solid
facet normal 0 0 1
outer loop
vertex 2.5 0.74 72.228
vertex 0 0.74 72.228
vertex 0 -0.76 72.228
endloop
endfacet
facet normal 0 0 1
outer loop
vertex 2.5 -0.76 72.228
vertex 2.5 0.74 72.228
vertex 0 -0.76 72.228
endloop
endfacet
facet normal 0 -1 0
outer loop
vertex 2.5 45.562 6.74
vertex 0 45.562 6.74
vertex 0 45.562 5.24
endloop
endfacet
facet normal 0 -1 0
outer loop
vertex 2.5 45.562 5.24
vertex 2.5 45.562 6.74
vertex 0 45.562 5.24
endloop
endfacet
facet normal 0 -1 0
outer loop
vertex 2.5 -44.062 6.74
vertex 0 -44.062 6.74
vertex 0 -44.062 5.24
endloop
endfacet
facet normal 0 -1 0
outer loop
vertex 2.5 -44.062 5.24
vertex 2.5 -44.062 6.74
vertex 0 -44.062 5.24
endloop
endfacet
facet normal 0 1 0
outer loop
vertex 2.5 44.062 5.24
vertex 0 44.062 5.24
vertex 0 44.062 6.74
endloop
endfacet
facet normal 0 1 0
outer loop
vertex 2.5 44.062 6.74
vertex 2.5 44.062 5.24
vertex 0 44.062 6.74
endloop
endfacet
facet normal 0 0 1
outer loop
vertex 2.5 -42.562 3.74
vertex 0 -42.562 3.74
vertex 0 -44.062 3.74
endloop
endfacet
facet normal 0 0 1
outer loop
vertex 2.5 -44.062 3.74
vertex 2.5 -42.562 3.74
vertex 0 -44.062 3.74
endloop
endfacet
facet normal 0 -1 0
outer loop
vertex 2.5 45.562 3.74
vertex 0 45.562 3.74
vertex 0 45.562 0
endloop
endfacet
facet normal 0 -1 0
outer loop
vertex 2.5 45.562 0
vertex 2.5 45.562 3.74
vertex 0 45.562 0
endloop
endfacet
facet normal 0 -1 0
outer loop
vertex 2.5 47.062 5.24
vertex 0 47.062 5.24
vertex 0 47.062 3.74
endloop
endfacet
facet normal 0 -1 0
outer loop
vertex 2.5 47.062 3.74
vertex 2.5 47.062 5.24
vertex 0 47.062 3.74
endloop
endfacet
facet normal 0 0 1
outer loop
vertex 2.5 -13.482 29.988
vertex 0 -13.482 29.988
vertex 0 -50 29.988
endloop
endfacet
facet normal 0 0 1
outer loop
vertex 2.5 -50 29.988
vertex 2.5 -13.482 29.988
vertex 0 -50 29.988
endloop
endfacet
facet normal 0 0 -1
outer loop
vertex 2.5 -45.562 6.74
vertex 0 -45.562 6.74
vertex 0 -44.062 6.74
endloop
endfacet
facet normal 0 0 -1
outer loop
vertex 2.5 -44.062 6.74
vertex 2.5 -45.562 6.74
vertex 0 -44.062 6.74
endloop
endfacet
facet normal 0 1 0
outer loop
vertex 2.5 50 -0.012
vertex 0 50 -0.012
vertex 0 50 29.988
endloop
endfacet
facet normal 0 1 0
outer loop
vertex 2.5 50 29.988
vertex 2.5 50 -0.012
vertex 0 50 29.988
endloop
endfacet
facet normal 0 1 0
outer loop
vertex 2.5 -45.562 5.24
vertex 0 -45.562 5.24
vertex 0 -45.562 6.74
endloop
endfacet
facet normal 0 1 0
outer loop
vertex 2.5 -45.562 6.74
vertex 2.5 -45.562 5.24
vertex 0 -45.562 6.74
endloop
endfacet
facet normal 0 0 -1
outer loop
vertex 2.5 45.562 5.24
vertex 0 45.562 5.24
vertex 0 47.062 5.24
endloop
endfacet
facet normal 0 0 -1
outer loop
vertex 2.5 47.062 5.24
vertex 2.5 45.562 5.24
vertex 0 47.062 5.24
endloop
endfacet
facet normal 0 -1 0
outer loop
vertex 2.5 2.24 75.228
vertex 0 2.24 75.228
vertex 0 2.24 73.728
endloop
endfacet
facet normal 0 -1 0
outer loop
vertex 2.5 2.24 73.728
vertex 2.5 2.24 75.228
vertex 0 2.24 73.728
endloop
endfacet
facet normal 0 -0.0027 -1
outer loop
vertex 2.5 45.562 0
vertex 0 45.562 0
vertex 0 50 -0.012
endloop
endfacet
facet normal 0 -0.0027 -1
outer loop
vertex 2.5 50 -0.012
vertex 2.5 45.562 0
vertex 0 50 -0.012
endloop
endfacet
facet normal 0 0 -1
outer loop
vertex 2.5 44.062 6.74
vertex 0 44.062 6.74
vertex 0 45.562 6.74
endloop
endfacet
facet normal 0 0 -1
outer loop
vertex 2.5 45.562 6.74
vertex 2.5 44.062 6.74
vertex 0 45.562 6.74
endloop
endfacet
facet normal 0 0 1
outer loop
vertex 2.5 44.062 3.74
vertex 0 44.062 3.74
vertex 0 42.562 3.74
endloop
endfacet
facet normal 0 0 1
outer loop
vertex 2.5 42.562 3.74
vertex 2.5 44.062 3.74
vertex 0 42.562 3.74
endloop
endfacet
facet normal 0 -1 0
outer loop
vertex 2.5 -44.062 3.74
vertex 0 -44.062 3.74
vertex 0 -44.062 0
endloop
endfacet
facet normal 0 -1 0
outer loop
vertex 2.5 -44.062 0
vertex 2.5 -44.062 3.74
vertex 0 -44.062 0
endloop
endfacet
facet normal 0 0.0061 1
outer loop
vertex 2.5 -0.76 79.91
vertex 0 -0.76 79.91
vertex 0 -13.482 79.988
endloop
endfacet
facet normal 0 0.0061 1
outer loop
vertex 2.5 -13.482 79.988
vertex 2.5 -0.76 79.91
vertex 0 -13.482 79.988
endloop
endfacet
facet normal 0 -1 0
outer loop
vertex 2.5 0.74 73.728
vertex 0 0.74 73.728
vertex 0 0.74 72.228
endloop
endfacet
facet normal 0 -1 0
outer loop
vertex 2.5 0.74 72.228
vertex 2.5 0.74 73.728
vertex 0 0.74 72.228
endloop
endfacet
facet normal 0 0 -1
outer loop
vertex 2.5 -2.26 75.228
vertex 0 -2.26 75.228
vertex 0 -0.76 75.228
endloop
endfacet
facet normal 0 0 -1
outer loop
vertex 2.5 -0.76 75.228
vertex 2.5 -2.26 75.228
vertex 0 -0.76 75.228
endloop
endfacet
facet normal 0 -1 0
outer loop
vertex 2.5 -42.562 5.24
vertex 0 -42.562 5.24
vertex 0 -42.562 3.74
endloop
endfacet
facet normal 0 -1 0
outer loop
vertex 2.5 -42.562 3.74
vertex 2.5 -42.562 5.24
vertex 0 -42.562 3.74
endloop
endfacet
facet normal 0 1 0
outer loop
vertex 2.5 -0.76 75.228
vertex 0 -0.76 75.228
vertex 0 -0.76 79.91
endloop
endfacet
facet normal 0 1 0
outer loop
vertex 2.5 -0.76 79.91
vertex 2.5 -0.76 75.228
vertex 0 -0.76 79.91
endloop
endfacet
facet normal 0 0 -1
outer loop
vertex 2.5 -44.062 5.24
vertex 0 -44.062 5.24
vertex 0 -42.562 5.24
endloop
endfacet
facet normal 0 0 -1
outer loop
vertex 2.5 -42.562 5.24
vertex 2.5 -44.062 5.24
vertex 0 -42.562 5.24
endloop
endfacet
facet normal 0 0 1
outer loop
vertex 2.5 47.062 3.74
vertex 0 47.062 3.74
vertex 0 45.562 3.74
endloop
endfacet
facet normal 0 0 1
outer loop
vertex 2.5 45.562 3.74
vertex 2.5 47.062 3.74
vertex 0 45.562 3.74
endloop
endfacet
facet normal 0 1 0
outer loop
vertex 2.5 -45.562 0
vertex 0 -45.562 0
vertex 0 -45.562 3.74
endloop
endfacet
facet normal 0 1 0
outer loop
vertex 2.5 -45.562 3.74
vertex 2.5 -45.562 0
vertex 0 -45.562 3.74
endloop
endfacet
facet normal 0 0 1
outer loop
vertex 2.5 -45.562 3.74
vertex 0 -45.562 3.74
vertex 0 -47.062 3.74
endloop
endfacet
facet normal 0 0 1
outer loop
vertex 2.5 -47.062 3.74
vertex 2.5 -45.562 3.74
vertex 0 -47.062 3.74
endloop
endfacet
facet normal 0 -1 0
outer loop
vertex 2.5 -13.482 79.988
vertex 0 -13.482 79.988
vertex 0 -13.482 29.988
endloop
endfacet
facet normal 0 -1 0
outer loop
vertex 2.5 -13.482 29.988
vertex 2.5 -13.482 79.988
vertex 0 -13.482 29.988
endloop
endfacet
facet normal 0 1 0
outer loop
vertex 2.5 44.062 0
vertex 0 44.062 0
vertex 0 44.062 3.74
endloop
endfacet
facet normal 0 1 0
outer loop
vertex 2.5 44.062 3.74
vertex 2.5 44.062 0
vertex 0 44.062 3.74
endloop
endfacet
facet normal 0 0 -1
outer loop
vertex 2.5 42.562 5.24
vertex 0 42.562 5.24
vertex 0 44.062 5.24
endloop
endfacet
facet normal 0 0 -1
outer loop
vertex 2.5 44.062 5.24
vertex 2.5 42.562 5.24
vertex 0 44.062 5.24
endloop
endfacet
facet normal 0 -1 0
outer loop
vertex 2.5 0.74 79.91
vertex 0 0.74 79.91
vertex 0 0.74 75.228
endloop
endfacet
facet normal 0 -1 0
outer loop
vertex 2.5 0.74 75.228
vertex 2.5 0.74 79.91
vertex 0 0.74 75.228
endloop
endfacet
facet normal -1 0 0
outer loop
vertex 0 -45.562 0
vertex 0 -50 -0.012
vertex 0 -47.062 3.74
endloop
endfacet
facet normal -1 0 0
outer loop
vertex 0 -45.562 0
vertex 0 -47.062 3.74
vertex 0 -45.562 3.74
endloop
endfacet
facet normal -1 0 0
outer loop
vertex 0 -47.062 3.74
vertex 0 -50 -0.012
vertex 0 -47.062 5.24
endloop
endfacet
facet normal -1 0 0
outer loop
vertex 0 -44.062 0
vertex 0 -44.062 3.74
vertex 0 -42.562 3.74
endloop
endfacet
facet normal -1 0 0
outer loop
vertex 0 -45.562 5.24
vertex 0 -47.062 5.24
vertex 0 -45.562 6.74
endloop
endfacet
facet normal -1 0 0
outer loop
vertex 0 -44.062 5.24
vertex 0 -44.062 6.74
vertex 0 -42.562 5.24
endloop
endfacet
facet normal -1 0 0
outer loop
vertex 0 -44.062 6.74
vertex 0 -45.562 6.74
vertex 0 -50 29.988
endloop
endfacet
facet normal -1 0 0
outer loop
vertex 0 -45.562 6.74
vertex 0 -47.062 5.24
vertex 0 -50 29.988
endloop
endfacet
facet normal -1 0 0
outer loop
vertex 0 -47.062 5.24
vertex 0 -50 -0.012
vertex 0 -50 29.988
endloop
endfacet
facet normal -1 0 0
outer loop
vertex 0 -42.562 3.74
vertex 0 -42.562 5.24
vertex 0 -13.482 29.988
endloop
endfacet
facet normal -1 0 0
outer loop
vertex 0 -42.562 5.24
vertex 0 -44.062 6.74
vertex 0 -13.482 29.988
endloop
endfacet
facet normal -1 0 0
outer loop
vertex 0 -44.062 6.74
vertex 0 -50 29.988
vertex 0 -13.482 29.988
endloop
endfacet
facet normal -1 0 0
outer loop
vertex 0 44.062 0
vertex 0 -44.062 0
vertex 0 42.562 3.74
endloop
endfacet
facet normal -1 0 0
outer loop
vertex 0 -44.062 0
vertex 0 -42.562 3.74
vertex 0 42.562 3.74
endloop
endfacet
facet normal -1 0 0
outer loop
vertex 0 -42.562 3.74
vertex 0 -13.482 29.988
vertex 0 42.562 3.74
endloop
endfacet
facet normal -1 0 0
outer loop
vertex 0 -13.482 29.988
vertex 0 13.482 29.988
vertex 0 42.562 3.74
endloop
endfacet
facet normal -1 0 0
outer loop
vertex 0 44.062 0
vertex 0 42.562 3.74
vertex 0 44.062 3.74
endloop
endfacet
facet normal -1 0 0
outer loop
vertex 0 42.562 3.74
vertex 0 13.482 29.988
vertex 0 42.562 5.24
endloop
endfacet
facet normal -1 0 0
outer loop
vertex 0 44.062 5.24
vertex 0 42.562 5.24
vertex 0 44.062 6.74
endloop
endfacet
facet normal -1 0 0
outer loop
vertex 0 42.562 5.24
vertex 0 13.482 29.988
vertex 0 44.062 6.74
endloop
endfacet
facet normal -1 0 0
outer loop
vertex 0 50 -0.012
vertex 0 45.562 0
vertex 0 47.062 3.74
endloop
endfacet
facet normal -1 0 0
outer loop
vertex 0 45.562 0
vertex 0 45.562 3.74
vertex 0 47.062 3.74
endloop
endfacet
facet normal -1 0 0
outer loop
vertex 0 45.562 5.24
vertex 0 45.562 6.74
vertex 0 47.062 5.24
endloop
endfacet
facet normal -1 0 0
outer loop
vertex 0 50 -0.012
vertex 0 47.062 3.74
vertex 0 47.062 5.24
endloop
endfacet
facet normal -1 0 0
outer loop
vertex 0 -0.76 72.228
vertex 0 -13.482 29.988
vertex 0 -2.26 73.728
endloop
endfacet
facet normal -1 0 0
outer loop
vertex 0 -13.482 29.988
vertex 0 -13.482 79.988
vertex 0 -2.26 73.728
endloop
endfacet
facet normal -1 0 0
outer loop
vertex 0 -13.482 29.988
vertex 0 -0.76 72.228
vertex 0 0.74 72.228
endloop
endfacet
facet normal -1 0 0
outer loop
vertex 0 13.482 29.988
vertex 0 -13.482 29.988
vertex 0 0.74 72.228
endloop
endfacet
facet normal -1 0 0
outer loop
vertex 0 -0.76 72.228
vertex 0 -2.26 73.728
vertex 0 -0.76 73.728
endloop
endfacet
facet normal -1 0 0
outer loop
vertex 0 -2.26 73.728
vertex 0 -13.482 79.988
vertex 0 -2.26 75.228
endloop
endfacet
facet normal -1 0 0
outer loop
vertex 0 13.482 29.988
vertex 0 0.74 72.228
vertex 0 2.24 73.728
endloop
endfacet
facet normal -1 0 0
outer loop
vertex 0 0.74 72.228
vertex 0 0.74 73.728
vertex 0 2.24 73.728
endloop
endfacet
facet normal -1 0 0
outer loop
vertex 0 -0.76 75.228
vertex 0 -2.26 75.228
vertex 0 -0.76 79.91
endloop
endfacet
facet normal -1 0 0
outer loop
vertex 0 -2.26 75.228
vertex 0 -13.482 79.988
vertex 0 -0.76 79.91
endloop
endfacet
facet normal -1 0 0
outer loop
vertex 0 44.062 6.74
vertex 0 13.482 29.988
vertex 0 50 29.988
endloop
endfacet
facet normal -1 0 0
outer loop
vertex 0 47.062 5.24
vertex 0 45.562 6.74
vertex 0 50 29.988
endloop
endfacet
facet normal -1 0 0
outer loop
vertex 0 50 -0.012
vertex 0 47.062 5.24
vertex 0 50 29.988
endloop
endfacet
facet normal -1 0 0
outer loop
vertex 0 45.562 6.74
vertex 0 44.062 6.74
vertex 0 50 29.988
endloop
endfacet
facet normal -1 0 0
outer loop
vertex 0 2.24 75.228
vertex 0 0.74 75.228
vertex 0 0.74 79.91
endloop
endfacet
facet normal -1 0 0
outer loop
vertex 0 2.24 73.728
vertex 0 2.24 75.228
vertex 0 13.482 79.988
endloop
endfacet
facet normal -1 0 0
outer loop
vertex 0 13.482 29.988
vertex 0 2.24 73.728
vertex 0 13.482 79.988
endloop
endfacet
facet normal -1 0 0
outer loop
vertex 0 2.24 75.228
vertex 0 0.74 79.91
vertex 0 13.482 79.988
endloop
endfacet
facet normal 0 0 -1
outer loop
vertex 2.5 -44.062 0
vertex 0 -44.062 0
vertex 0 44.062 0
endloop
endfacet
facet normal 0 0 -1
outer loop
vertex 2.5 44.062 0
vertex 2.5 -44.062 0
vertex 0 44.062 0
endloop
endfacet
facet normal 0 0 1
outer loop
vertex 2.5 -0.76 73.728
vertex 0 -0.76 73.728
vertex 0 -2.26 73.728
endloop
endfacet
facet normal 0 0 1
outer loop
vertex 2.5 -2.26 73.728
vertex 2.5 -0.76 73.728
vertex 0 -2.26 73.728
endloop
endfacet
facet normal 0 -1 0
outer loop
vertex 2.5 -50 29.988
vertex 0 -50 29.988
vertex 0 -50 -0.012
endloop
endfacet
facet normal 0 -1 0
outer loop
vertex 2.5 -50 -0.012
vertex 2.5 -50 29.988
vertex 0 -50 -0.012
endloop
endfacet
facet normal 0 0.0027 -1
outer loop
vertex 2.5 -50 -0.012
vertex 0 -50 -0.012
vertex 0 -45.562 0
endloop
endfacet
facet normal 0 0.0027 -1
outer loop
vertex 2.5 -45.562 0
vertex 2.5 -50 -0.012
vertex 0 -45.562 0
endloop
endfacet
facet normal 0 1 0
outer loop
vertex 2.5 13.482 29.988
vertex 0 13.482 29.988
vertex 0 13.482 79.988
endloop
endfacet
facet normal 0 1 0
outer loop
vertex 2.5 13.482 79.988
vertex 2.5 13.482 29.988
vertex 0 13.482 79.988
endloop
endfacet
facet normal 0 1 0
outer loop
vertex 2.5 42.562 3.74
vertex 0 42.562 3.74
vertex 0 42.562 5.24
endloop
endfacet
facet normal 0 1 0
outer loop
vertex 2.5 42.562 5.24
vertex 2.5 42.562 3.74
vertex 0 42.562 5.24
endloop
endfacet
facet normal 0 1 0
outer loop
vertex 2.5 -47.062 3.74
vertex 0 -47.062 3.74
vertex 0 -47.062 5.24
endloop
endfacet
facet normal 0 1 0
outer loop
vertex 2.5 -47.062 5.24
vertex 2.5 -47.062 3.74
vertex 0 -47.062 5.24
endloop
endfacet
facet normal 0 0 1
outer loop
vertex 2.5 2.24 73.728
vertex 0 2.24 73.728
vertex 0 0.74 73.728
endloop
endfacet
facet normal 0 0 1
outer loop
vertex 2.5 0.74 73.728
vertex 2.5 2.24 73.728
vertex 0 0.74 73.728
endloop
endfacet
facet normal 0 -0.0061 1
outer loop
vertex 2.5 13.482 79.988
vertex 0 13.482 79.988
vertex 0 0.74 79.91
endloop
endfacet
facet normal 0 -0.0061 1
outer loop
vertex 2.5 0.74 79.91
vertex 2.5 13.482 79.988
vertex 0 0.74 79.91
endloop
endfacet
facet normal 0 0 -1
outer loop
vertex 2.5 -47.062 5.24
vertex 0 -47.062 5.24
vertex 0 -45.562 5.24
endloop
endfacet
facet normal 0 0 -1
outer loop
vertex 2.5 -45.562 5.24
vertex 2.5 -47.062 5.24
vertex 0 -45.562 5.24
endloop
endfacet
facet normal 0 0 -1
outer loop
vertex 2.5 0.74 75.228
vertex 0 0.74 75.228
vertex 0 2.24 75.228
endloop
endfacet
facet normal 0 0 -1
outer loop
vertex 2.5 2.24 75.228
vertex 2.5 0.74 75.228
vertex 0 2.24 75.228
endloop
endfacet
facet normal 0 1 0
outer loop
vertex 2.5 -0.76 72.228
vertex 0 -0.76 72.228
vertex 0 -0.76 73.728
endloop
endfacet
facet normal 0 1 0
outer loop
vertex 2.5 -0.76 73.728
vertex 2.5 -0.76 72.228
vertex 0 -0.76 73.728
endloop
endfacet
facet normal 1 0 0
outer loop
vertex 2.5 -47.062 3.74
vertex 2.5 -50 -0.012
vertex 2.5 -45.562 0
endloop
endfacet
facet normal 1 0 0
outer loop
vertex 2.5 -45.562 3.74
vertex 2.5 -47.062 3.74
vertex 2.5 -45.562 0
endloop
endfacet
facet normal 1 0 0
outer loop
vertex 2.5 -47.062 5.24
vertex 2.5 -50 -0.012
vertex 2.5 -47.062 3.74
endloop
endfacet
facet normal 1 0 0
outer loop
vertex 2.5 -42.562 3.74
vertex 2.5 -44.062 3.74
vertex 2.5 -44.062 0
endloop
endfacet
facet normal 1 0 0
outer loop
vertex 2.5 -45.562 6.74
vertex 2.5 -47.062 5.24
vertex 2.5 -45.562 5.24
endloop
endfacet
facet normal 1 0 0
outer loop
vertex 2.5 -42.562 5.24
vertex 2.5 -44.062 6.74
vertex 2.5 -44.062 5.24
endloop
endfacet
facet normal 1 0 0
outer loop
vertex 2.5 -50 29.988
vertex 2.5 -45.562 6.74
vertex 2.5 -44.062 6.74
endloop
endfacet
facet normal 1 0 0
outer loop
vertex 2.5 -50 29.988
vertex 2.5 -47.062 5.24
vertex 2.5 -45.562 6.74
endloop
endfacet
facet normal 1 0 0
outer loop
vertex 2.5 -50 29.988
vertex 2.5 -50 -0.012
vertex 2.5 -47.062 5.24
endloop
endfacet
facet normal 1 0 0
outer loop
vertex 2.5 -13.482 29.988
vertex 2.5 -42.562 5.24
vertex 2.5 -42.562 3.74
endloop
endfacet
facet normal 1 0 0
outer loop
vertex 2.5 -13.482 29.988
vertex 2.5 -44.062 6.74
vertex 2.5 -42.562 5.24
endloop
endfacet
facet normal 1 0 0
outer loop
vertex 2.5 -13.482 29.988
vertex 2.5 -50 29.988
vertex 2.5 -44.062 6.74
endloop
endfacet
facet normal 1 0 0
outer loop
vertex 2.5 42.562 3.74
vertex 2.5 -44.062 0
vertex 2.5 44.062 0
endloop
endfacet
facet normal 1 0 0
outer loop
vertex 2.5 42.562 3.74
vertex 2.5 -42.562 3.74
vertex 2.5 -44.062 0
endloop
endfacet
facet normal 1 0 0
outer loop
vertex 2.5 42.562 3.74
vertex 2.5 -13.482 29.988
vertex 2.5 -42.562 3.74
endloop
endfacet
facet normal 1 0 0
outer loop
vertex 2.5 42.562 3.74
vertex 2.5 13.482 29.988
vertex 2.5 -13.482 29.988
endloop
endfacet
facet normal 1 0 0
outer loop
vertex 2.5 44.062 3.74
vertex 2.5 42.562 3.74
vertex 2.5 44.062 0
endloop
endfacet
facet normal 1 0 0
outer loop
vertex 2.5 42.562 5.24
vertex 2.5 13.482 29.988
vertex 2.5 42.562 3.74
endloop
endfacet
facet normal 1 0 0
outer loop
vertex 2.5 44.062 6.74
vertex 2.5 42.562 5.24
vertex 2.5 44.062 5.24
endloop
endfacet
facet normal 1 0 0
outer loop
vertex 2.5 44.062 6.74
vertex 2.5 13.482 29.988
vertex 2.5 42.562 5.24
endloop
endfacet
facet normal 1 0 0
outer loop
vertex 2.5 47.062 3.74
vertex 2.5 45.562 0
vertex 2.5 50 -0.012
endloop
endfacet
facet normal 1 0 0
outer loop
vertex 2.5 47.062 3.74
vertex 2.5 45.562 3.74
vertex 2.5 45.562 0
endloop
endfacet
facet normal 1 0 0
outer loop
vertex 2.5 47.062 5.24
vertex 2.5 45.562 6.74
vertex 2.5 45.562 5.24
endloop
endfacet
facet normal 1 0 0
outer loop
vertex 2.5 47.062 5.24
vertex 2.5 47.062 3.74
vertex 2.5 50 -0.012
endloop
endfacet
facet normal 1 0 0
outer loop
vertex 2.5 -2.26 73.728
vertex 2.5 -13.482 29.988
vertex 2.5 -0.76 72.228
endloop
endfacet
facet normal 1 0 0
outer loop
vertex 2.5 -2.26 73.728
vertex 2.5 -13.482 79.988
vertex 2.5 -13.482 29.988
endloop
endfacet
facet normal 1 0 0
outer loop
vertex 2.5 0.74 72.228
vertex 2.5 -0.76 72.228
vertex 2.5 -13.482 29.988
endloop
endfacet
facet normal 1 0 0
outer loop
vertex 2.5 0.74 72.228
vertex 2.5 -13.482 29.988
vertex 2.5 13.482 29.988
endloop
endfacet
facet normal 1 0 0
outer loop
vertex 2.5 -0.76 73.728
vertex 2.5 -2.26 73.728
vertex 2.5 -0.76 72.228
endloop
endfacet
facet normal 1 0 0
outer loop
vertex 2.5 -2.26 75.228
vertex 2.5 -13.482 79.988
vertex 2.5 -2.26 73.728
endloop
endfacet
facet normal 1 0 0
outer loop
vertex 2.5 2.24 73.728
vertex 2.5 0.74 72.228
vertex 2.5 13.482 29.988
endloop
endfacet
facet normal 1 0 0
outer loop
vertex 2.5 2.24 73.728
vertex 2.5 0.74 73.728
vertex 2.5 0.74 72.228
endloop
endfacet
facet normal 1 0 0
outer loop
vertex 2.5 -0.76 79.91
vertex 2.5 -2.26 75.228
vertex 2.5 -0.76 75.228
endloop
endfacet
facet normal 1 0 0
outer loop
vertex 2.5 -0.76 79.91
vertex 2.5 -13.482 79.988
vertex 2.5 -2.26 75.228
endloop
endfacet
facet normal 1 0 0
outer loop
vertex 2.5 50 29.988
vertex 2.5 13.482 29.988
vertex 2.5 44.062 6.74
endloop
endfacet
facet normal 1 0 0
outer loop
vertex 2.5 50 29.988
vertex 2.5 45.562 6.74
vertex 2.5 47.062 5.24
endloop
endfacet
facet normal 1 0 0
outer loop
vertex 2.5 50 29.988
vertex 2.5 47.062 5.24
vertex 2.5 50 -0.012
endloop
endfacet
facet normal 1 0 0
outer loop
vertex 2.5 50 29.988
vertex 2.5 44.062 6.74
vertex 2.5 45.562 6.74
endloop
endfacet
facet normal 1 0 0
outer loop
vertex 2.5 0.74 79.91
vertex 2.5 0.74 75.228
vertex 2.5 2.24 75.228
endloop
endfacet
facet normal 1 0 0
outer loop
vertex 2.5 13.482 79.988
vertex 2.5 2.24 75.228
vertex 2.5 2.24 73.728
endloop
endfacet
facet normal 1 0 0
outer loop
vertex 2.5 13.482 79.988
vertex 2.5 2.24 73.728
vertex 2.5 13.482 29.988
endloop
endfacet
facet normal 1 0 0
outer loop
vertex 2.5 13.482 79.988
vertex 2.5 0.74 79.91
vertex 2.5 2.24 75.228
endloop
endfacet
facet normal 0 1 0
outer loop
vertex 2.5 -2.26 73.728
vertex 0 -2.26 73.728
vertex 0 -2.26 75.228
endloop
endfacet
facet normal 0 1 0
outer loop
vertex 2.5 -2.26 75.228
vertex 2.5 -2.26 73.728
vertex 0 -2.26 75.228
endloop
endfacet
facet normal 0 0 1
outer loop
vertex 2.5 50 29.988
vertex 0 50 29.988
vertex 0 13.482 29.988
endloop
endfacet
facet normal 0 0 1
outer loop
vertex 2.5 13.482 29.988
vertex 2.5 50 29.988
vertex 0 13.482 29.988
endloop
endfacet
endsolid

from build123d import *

# Parameters (mm, degrees)
F1_DEPTH = 2.5


# Not quite as in the source:
# - a feature names something its author has since deleted; it is built from what else it names


with BuildPart() as f1:
    # F0 (on Right) → F1 (new body)
    with BuildSketch(Plane.YZ):
        Polygon((45.5622866154, 0), (50, -0.0115907192), (50, 29.9884092808), (13.482012786, 29.9884092808), (13.482012786, 79.9884092808), (0.7398080197, 79.910288877), (0.7398080197, 75.2277448773), (2.2398080197, 75.2277448773), (2.2398080197, 73.7277448773), (0.7398080197, 73.7277448773), (0.7398080197, 72.2277448773), (-0.7601919803, 72.2277448773), (-0.7601919803, 73.7277448773), (-2.2601919803, 73.7277448773), (-2.2601919803, 75.2277448773), (-0.7601919803, 75.2277448773), (-0.7601919803, 79.9100687942), (-13.482012786, 79.9884092808), (-13.482012786, 29.9884092808), (-50, 29.9884092808), (-50, -0.0115907192), (-45.5622866154, 0), (-45.5622866154, 3.739590158), (-47.0622866154, 3.739590158), (-47.0622866154, 5.239590158), (-45.5622866154, 5.239590158), (-45.5622866154, 6.739590158), (-44.0622866154, 6.739590158), (-44.0622866154, 5.239590158), (-42.5622866154, 5.239590158), (-42.5622866154, 3.739590158), (-44.0622866154, 3.739590158), (-44.0622866154, 0), (0, 0), (44.0622866154, 0), (44.0622866154, 3.739590158), (42.5622866154, 3.739590158), (42.5622866154, 5.239590158), (44.0622866154, 5.239590158), (44.0622866154, 6.739590158), (45.5622866154, 6.739590158), (45.5622866154, 5.239590158), (47.0622866154, 5.239590158), (47.0622866154, 3.739590158), (45.5622866154, 3.739590158), align=None)
    extrude(amount=F1_DEPTH)


solid = f1.part
